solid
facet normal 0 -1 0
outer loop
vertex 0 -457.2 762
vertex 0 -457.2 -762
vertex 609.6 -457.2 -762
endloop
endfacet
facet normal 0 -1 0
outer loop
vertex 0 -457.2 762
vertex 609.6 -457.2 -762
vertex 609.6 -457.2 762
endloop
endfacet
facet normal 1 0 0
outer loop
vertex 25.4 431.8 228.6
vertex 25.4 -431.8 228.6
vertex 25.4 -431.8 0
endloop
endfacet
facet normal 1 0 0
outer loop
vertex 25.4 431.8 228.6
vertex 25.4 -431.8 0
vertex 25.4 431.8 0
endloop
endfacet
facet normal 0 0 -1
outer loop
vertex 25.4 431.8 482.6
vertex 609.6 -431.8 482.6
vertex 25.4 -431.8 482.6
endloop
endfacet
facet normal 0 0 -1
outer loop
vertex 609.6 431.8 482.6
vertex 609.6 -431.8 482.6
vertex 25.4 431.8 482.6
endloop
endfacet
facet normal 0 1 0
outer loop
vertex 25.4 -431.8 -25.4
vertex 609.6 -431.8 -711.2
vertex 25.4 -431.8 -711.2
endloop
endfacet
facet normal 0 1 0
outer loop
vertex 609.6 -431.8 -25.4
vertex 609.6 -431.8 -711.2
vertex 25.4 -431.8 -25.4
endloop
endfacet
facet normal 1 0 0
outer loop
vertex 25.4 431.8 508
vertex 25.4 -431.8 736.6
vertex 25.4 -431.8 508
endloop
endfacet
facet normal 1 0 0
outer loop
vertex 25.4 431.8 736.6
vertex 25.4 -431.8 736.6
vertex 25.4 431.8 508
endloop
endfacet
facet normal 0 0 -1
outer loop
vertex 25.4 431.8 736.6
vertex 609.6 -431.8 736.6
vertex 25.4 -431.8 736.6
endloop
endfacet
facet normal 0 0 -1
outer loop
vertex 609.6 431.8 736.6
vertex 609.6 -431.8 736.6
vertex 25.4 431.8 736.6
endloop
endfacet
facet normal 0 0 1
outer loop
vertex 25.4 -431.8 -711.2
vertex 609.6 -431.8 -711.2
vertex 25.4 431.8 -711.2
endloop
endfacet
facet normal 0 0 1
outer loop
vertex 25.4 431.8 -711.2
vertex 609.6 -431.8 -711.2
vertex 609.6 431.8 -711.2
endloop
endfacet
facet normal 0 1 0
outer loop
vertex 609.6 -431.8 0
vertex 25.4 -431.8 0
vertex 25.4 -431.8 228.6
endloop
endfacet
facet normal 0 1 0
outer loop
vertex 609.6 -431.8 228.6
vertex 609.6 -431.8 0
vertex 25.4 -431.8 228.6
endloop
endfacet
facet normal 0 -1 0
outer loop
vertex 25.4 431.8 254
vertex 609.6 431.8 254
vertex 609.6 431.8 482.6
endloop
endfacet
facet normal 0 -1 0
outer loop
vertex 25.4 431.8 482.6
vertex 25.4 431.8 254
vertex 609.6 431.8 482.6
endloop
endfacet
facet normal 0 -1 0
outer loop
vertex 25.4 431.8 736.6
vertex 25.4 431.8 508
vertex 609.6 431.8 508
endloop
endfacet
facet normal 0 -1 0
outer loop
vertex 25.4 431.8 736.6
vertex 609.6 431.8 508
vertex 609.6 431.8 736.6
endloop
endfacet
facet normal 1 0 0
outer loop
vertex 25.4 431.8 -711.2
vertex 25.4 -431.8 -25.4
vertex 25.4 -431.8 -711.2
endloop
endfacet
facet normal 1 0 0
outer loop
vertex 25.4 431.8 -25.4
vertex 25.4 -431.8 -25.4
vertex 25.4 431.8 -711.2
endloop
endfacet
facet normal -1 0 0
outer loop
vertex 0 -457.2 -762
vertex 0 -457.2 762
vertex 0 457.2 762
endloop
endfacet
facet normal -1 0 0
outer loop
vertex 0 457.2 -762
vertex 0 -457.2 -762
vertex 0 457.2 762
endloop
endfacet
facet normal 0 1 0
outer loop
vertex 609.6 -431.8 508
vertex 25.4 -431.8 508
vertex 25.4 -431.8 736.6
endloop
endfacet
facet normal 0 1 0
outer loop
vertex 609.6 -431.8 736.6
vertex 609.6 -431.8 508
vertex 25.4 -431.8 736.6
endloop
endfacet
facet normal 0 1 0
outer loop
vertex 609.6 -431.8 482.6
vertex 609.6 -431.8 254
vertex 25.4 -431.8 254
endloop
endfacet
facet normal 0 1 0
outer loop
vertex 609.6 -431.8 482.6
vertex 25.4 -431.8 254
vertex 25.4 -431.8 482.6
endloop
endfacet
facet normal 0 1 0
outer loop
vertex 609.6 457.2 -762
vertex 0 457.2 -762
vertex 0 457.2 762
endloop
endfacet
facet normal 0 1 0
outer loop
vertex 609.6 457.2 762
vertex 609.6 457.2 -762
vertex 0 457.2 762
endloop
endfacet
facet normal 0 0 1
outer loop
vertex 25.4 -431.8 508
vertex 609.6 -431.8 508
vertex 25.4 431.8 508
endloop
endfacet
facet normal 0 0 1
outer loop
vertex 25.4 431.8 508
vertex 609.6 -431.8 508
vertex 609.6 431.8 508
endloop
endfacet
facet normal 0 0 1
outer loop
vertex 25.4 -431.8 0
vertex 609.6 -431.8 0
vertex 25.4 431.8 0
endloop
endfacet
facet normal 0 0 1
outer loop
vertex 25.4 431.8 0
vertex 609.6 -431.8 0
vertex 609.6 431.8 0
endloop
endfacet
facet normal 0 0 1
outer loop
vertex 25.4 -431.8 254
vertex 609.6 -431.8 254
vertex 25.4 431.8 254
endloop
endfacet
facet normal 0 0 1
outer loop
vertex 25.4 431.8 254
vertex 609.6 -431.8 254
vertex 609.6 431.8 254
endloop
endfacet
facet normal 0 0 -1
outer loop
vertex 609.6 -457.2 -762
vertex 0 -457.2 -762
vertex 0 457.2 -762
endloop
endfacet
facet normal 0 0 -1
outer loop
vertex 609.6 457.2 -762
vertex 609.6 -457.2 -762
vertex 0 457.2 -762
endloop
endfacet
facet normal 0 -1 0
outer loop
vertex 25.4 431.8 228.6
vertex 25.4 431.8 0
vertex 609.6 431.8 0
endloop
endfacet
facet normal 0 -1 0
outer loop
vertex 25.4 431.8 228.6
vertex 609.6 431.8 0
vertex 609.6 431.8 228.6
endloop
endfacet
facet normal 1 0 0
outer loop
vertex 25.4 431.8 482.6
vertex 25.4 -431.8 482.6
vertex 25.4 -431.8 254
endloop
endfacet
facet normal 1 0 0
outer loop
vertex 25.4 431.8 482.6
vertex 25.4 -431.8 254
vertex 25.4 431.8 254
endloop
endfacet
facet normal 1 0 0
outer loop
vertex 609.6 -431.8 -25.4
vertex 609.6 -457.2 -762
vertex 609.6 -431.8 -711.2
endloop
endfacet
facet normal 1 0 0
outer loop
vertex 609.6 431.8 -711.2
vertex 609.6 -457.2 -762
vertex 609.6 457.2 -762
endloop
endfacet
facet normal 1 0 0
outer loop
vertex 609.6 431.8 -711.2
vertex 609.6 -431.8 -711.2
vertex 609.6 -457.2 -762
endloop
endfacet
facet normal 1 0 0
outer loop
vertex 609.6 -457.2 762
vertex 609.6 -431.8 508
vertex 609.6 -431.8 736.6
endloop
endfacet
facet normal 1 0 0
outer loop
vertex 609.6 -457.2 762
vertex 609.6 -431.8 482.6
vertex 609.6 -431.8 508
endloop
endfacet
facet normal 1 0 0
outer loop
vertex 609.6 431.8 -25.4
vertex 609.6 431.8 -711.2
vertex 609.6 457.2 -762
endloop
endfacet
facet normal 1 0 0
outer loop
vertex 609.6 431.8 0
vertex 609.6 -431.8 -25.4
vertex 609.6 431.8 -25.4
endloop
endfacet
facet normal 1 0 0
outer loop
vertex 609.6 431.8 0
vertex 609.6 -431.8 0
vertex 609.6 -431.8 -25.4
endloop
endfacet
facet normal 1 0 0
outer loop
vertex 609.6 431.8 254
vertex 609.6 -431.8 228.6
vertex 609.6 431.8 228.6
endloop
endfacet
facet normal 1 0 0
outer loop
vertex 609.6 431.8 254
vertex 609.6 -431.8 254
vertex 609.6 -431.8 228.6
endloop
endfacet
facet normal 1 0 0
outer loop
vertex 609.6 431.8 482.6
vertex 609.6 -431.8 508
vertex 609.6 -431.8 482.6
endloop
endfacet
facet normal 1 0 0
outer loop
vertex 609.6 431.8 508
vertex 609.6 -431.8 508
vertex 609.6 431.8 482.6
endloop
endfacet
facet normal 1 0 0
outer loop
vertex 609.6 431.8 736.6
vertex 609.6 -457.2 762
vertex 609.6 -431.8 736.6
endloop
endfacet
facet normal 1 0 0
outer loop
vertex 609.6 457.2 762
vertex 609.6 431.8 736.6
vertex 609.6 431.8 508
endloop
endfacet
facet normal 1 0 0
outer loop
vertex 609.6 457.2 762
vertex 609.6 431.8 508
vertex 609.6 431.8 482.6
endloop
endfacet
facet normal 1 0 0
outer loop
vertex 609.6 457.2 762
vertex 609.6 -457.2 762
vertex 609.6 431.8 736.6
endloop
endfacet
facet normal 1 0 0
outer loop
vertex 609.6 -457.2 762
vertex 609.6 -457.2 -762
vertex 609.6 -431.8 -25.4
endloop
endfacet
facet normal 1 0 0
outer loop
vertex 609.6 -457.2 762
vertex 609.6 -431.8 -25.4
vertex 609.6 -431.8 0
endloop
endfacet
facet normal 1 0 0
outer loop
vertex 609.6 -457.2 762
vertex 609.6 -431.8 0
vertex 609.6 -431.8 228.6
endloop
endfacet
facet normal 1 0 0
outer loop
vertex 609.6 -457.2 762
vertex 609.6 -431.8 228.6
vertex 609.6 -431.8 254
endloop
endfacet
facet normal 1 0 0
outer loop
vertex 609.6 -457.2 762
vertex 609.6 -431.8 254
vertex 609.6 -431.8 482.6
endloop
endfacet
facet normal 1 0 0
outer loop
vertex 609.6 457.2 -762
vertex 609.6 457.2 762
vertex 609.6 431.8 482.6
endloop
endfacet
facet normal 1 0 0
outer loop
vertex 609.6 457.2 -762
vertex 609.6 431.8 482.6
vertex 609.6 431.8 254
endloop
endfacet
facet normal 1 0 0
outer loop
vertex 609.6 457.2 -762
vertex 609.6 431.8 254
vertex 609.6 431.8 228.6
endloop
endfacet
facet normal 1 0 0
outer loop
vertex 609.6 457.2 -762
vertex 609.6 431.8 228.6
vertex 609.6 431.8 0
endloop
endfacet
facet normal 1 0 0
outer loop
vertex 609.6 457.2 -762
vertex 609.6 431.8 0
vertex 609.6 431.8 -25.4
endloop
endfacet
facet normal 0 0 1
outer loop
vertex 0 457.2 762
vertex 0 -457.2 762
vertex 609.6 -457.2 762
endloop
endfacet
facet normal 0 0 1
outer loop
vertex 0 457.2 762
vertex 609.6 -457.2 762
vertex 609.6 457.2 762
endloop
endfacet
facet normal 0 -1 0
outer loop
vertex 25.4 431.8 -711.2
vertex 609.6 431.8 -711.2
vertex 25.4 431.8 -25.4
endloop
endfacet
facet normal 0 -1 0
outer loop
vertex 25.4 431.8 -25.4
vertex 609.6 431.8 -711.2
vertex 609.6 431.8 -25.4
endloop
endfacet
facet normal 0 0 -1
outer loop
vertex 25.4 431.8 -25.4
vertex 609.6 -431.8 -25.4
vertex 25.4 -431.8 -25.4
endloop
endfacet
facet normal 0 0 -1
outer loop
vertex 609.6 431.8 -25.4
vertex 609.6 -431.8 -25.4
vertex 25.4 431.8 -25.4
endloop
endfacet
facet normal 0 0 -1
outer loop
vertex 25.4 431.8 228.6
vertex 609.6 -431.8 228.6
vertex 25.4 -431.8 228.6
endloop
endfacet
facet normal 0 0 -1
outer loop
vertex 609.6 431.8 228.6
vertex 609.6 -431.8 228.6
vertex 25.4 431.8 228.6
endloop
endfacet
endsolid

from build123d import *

# Parameters (mm, degrees)
F0_W     = 914.4
F0_H     = 1524
F1_DEPTH = 609.6
F2_W     = 863.6
F2_H     = 228.6
F3_DEPTH = 584.2
F4_W     = 863.6
F4_H     = 685.8
F5_DEPTH = 584.2


with BuildPart() as f1:
    # F0 (on Right) → F1 (new body)
    with BuildSketch(Plane.YZ):
        Rectangle(F0_W, F0_H)
    extrude(amount=F1_DEPTH)

    # F2 (on face) → F3 (cut)
    with BuildSketch(Plane.YZ.offset(609.6)):
        with Locations((0, 622.3)):
            Rectangle(F2_W, F2_H)
        with Locations((0, 368.3)):
            Rectangle(F2_W, F2_H)
        with Locations((0, 114.3)):
            Rectangle(F2_W, F2_H)
    extrude(amount=-F3_DEPTH, mode=Mode.SUBTRACT)

    # F4 (on face) → F5 (cut)
    with BuildSketch(Plane.YZ.offset(609.6)):
        with Locations((0, -368.3)):
            Rectangle(F4_W, F4_H)
    extrude(amount=-F5_DEPTH, mode=Mode.SUBTRACT)


solid = f1.part
